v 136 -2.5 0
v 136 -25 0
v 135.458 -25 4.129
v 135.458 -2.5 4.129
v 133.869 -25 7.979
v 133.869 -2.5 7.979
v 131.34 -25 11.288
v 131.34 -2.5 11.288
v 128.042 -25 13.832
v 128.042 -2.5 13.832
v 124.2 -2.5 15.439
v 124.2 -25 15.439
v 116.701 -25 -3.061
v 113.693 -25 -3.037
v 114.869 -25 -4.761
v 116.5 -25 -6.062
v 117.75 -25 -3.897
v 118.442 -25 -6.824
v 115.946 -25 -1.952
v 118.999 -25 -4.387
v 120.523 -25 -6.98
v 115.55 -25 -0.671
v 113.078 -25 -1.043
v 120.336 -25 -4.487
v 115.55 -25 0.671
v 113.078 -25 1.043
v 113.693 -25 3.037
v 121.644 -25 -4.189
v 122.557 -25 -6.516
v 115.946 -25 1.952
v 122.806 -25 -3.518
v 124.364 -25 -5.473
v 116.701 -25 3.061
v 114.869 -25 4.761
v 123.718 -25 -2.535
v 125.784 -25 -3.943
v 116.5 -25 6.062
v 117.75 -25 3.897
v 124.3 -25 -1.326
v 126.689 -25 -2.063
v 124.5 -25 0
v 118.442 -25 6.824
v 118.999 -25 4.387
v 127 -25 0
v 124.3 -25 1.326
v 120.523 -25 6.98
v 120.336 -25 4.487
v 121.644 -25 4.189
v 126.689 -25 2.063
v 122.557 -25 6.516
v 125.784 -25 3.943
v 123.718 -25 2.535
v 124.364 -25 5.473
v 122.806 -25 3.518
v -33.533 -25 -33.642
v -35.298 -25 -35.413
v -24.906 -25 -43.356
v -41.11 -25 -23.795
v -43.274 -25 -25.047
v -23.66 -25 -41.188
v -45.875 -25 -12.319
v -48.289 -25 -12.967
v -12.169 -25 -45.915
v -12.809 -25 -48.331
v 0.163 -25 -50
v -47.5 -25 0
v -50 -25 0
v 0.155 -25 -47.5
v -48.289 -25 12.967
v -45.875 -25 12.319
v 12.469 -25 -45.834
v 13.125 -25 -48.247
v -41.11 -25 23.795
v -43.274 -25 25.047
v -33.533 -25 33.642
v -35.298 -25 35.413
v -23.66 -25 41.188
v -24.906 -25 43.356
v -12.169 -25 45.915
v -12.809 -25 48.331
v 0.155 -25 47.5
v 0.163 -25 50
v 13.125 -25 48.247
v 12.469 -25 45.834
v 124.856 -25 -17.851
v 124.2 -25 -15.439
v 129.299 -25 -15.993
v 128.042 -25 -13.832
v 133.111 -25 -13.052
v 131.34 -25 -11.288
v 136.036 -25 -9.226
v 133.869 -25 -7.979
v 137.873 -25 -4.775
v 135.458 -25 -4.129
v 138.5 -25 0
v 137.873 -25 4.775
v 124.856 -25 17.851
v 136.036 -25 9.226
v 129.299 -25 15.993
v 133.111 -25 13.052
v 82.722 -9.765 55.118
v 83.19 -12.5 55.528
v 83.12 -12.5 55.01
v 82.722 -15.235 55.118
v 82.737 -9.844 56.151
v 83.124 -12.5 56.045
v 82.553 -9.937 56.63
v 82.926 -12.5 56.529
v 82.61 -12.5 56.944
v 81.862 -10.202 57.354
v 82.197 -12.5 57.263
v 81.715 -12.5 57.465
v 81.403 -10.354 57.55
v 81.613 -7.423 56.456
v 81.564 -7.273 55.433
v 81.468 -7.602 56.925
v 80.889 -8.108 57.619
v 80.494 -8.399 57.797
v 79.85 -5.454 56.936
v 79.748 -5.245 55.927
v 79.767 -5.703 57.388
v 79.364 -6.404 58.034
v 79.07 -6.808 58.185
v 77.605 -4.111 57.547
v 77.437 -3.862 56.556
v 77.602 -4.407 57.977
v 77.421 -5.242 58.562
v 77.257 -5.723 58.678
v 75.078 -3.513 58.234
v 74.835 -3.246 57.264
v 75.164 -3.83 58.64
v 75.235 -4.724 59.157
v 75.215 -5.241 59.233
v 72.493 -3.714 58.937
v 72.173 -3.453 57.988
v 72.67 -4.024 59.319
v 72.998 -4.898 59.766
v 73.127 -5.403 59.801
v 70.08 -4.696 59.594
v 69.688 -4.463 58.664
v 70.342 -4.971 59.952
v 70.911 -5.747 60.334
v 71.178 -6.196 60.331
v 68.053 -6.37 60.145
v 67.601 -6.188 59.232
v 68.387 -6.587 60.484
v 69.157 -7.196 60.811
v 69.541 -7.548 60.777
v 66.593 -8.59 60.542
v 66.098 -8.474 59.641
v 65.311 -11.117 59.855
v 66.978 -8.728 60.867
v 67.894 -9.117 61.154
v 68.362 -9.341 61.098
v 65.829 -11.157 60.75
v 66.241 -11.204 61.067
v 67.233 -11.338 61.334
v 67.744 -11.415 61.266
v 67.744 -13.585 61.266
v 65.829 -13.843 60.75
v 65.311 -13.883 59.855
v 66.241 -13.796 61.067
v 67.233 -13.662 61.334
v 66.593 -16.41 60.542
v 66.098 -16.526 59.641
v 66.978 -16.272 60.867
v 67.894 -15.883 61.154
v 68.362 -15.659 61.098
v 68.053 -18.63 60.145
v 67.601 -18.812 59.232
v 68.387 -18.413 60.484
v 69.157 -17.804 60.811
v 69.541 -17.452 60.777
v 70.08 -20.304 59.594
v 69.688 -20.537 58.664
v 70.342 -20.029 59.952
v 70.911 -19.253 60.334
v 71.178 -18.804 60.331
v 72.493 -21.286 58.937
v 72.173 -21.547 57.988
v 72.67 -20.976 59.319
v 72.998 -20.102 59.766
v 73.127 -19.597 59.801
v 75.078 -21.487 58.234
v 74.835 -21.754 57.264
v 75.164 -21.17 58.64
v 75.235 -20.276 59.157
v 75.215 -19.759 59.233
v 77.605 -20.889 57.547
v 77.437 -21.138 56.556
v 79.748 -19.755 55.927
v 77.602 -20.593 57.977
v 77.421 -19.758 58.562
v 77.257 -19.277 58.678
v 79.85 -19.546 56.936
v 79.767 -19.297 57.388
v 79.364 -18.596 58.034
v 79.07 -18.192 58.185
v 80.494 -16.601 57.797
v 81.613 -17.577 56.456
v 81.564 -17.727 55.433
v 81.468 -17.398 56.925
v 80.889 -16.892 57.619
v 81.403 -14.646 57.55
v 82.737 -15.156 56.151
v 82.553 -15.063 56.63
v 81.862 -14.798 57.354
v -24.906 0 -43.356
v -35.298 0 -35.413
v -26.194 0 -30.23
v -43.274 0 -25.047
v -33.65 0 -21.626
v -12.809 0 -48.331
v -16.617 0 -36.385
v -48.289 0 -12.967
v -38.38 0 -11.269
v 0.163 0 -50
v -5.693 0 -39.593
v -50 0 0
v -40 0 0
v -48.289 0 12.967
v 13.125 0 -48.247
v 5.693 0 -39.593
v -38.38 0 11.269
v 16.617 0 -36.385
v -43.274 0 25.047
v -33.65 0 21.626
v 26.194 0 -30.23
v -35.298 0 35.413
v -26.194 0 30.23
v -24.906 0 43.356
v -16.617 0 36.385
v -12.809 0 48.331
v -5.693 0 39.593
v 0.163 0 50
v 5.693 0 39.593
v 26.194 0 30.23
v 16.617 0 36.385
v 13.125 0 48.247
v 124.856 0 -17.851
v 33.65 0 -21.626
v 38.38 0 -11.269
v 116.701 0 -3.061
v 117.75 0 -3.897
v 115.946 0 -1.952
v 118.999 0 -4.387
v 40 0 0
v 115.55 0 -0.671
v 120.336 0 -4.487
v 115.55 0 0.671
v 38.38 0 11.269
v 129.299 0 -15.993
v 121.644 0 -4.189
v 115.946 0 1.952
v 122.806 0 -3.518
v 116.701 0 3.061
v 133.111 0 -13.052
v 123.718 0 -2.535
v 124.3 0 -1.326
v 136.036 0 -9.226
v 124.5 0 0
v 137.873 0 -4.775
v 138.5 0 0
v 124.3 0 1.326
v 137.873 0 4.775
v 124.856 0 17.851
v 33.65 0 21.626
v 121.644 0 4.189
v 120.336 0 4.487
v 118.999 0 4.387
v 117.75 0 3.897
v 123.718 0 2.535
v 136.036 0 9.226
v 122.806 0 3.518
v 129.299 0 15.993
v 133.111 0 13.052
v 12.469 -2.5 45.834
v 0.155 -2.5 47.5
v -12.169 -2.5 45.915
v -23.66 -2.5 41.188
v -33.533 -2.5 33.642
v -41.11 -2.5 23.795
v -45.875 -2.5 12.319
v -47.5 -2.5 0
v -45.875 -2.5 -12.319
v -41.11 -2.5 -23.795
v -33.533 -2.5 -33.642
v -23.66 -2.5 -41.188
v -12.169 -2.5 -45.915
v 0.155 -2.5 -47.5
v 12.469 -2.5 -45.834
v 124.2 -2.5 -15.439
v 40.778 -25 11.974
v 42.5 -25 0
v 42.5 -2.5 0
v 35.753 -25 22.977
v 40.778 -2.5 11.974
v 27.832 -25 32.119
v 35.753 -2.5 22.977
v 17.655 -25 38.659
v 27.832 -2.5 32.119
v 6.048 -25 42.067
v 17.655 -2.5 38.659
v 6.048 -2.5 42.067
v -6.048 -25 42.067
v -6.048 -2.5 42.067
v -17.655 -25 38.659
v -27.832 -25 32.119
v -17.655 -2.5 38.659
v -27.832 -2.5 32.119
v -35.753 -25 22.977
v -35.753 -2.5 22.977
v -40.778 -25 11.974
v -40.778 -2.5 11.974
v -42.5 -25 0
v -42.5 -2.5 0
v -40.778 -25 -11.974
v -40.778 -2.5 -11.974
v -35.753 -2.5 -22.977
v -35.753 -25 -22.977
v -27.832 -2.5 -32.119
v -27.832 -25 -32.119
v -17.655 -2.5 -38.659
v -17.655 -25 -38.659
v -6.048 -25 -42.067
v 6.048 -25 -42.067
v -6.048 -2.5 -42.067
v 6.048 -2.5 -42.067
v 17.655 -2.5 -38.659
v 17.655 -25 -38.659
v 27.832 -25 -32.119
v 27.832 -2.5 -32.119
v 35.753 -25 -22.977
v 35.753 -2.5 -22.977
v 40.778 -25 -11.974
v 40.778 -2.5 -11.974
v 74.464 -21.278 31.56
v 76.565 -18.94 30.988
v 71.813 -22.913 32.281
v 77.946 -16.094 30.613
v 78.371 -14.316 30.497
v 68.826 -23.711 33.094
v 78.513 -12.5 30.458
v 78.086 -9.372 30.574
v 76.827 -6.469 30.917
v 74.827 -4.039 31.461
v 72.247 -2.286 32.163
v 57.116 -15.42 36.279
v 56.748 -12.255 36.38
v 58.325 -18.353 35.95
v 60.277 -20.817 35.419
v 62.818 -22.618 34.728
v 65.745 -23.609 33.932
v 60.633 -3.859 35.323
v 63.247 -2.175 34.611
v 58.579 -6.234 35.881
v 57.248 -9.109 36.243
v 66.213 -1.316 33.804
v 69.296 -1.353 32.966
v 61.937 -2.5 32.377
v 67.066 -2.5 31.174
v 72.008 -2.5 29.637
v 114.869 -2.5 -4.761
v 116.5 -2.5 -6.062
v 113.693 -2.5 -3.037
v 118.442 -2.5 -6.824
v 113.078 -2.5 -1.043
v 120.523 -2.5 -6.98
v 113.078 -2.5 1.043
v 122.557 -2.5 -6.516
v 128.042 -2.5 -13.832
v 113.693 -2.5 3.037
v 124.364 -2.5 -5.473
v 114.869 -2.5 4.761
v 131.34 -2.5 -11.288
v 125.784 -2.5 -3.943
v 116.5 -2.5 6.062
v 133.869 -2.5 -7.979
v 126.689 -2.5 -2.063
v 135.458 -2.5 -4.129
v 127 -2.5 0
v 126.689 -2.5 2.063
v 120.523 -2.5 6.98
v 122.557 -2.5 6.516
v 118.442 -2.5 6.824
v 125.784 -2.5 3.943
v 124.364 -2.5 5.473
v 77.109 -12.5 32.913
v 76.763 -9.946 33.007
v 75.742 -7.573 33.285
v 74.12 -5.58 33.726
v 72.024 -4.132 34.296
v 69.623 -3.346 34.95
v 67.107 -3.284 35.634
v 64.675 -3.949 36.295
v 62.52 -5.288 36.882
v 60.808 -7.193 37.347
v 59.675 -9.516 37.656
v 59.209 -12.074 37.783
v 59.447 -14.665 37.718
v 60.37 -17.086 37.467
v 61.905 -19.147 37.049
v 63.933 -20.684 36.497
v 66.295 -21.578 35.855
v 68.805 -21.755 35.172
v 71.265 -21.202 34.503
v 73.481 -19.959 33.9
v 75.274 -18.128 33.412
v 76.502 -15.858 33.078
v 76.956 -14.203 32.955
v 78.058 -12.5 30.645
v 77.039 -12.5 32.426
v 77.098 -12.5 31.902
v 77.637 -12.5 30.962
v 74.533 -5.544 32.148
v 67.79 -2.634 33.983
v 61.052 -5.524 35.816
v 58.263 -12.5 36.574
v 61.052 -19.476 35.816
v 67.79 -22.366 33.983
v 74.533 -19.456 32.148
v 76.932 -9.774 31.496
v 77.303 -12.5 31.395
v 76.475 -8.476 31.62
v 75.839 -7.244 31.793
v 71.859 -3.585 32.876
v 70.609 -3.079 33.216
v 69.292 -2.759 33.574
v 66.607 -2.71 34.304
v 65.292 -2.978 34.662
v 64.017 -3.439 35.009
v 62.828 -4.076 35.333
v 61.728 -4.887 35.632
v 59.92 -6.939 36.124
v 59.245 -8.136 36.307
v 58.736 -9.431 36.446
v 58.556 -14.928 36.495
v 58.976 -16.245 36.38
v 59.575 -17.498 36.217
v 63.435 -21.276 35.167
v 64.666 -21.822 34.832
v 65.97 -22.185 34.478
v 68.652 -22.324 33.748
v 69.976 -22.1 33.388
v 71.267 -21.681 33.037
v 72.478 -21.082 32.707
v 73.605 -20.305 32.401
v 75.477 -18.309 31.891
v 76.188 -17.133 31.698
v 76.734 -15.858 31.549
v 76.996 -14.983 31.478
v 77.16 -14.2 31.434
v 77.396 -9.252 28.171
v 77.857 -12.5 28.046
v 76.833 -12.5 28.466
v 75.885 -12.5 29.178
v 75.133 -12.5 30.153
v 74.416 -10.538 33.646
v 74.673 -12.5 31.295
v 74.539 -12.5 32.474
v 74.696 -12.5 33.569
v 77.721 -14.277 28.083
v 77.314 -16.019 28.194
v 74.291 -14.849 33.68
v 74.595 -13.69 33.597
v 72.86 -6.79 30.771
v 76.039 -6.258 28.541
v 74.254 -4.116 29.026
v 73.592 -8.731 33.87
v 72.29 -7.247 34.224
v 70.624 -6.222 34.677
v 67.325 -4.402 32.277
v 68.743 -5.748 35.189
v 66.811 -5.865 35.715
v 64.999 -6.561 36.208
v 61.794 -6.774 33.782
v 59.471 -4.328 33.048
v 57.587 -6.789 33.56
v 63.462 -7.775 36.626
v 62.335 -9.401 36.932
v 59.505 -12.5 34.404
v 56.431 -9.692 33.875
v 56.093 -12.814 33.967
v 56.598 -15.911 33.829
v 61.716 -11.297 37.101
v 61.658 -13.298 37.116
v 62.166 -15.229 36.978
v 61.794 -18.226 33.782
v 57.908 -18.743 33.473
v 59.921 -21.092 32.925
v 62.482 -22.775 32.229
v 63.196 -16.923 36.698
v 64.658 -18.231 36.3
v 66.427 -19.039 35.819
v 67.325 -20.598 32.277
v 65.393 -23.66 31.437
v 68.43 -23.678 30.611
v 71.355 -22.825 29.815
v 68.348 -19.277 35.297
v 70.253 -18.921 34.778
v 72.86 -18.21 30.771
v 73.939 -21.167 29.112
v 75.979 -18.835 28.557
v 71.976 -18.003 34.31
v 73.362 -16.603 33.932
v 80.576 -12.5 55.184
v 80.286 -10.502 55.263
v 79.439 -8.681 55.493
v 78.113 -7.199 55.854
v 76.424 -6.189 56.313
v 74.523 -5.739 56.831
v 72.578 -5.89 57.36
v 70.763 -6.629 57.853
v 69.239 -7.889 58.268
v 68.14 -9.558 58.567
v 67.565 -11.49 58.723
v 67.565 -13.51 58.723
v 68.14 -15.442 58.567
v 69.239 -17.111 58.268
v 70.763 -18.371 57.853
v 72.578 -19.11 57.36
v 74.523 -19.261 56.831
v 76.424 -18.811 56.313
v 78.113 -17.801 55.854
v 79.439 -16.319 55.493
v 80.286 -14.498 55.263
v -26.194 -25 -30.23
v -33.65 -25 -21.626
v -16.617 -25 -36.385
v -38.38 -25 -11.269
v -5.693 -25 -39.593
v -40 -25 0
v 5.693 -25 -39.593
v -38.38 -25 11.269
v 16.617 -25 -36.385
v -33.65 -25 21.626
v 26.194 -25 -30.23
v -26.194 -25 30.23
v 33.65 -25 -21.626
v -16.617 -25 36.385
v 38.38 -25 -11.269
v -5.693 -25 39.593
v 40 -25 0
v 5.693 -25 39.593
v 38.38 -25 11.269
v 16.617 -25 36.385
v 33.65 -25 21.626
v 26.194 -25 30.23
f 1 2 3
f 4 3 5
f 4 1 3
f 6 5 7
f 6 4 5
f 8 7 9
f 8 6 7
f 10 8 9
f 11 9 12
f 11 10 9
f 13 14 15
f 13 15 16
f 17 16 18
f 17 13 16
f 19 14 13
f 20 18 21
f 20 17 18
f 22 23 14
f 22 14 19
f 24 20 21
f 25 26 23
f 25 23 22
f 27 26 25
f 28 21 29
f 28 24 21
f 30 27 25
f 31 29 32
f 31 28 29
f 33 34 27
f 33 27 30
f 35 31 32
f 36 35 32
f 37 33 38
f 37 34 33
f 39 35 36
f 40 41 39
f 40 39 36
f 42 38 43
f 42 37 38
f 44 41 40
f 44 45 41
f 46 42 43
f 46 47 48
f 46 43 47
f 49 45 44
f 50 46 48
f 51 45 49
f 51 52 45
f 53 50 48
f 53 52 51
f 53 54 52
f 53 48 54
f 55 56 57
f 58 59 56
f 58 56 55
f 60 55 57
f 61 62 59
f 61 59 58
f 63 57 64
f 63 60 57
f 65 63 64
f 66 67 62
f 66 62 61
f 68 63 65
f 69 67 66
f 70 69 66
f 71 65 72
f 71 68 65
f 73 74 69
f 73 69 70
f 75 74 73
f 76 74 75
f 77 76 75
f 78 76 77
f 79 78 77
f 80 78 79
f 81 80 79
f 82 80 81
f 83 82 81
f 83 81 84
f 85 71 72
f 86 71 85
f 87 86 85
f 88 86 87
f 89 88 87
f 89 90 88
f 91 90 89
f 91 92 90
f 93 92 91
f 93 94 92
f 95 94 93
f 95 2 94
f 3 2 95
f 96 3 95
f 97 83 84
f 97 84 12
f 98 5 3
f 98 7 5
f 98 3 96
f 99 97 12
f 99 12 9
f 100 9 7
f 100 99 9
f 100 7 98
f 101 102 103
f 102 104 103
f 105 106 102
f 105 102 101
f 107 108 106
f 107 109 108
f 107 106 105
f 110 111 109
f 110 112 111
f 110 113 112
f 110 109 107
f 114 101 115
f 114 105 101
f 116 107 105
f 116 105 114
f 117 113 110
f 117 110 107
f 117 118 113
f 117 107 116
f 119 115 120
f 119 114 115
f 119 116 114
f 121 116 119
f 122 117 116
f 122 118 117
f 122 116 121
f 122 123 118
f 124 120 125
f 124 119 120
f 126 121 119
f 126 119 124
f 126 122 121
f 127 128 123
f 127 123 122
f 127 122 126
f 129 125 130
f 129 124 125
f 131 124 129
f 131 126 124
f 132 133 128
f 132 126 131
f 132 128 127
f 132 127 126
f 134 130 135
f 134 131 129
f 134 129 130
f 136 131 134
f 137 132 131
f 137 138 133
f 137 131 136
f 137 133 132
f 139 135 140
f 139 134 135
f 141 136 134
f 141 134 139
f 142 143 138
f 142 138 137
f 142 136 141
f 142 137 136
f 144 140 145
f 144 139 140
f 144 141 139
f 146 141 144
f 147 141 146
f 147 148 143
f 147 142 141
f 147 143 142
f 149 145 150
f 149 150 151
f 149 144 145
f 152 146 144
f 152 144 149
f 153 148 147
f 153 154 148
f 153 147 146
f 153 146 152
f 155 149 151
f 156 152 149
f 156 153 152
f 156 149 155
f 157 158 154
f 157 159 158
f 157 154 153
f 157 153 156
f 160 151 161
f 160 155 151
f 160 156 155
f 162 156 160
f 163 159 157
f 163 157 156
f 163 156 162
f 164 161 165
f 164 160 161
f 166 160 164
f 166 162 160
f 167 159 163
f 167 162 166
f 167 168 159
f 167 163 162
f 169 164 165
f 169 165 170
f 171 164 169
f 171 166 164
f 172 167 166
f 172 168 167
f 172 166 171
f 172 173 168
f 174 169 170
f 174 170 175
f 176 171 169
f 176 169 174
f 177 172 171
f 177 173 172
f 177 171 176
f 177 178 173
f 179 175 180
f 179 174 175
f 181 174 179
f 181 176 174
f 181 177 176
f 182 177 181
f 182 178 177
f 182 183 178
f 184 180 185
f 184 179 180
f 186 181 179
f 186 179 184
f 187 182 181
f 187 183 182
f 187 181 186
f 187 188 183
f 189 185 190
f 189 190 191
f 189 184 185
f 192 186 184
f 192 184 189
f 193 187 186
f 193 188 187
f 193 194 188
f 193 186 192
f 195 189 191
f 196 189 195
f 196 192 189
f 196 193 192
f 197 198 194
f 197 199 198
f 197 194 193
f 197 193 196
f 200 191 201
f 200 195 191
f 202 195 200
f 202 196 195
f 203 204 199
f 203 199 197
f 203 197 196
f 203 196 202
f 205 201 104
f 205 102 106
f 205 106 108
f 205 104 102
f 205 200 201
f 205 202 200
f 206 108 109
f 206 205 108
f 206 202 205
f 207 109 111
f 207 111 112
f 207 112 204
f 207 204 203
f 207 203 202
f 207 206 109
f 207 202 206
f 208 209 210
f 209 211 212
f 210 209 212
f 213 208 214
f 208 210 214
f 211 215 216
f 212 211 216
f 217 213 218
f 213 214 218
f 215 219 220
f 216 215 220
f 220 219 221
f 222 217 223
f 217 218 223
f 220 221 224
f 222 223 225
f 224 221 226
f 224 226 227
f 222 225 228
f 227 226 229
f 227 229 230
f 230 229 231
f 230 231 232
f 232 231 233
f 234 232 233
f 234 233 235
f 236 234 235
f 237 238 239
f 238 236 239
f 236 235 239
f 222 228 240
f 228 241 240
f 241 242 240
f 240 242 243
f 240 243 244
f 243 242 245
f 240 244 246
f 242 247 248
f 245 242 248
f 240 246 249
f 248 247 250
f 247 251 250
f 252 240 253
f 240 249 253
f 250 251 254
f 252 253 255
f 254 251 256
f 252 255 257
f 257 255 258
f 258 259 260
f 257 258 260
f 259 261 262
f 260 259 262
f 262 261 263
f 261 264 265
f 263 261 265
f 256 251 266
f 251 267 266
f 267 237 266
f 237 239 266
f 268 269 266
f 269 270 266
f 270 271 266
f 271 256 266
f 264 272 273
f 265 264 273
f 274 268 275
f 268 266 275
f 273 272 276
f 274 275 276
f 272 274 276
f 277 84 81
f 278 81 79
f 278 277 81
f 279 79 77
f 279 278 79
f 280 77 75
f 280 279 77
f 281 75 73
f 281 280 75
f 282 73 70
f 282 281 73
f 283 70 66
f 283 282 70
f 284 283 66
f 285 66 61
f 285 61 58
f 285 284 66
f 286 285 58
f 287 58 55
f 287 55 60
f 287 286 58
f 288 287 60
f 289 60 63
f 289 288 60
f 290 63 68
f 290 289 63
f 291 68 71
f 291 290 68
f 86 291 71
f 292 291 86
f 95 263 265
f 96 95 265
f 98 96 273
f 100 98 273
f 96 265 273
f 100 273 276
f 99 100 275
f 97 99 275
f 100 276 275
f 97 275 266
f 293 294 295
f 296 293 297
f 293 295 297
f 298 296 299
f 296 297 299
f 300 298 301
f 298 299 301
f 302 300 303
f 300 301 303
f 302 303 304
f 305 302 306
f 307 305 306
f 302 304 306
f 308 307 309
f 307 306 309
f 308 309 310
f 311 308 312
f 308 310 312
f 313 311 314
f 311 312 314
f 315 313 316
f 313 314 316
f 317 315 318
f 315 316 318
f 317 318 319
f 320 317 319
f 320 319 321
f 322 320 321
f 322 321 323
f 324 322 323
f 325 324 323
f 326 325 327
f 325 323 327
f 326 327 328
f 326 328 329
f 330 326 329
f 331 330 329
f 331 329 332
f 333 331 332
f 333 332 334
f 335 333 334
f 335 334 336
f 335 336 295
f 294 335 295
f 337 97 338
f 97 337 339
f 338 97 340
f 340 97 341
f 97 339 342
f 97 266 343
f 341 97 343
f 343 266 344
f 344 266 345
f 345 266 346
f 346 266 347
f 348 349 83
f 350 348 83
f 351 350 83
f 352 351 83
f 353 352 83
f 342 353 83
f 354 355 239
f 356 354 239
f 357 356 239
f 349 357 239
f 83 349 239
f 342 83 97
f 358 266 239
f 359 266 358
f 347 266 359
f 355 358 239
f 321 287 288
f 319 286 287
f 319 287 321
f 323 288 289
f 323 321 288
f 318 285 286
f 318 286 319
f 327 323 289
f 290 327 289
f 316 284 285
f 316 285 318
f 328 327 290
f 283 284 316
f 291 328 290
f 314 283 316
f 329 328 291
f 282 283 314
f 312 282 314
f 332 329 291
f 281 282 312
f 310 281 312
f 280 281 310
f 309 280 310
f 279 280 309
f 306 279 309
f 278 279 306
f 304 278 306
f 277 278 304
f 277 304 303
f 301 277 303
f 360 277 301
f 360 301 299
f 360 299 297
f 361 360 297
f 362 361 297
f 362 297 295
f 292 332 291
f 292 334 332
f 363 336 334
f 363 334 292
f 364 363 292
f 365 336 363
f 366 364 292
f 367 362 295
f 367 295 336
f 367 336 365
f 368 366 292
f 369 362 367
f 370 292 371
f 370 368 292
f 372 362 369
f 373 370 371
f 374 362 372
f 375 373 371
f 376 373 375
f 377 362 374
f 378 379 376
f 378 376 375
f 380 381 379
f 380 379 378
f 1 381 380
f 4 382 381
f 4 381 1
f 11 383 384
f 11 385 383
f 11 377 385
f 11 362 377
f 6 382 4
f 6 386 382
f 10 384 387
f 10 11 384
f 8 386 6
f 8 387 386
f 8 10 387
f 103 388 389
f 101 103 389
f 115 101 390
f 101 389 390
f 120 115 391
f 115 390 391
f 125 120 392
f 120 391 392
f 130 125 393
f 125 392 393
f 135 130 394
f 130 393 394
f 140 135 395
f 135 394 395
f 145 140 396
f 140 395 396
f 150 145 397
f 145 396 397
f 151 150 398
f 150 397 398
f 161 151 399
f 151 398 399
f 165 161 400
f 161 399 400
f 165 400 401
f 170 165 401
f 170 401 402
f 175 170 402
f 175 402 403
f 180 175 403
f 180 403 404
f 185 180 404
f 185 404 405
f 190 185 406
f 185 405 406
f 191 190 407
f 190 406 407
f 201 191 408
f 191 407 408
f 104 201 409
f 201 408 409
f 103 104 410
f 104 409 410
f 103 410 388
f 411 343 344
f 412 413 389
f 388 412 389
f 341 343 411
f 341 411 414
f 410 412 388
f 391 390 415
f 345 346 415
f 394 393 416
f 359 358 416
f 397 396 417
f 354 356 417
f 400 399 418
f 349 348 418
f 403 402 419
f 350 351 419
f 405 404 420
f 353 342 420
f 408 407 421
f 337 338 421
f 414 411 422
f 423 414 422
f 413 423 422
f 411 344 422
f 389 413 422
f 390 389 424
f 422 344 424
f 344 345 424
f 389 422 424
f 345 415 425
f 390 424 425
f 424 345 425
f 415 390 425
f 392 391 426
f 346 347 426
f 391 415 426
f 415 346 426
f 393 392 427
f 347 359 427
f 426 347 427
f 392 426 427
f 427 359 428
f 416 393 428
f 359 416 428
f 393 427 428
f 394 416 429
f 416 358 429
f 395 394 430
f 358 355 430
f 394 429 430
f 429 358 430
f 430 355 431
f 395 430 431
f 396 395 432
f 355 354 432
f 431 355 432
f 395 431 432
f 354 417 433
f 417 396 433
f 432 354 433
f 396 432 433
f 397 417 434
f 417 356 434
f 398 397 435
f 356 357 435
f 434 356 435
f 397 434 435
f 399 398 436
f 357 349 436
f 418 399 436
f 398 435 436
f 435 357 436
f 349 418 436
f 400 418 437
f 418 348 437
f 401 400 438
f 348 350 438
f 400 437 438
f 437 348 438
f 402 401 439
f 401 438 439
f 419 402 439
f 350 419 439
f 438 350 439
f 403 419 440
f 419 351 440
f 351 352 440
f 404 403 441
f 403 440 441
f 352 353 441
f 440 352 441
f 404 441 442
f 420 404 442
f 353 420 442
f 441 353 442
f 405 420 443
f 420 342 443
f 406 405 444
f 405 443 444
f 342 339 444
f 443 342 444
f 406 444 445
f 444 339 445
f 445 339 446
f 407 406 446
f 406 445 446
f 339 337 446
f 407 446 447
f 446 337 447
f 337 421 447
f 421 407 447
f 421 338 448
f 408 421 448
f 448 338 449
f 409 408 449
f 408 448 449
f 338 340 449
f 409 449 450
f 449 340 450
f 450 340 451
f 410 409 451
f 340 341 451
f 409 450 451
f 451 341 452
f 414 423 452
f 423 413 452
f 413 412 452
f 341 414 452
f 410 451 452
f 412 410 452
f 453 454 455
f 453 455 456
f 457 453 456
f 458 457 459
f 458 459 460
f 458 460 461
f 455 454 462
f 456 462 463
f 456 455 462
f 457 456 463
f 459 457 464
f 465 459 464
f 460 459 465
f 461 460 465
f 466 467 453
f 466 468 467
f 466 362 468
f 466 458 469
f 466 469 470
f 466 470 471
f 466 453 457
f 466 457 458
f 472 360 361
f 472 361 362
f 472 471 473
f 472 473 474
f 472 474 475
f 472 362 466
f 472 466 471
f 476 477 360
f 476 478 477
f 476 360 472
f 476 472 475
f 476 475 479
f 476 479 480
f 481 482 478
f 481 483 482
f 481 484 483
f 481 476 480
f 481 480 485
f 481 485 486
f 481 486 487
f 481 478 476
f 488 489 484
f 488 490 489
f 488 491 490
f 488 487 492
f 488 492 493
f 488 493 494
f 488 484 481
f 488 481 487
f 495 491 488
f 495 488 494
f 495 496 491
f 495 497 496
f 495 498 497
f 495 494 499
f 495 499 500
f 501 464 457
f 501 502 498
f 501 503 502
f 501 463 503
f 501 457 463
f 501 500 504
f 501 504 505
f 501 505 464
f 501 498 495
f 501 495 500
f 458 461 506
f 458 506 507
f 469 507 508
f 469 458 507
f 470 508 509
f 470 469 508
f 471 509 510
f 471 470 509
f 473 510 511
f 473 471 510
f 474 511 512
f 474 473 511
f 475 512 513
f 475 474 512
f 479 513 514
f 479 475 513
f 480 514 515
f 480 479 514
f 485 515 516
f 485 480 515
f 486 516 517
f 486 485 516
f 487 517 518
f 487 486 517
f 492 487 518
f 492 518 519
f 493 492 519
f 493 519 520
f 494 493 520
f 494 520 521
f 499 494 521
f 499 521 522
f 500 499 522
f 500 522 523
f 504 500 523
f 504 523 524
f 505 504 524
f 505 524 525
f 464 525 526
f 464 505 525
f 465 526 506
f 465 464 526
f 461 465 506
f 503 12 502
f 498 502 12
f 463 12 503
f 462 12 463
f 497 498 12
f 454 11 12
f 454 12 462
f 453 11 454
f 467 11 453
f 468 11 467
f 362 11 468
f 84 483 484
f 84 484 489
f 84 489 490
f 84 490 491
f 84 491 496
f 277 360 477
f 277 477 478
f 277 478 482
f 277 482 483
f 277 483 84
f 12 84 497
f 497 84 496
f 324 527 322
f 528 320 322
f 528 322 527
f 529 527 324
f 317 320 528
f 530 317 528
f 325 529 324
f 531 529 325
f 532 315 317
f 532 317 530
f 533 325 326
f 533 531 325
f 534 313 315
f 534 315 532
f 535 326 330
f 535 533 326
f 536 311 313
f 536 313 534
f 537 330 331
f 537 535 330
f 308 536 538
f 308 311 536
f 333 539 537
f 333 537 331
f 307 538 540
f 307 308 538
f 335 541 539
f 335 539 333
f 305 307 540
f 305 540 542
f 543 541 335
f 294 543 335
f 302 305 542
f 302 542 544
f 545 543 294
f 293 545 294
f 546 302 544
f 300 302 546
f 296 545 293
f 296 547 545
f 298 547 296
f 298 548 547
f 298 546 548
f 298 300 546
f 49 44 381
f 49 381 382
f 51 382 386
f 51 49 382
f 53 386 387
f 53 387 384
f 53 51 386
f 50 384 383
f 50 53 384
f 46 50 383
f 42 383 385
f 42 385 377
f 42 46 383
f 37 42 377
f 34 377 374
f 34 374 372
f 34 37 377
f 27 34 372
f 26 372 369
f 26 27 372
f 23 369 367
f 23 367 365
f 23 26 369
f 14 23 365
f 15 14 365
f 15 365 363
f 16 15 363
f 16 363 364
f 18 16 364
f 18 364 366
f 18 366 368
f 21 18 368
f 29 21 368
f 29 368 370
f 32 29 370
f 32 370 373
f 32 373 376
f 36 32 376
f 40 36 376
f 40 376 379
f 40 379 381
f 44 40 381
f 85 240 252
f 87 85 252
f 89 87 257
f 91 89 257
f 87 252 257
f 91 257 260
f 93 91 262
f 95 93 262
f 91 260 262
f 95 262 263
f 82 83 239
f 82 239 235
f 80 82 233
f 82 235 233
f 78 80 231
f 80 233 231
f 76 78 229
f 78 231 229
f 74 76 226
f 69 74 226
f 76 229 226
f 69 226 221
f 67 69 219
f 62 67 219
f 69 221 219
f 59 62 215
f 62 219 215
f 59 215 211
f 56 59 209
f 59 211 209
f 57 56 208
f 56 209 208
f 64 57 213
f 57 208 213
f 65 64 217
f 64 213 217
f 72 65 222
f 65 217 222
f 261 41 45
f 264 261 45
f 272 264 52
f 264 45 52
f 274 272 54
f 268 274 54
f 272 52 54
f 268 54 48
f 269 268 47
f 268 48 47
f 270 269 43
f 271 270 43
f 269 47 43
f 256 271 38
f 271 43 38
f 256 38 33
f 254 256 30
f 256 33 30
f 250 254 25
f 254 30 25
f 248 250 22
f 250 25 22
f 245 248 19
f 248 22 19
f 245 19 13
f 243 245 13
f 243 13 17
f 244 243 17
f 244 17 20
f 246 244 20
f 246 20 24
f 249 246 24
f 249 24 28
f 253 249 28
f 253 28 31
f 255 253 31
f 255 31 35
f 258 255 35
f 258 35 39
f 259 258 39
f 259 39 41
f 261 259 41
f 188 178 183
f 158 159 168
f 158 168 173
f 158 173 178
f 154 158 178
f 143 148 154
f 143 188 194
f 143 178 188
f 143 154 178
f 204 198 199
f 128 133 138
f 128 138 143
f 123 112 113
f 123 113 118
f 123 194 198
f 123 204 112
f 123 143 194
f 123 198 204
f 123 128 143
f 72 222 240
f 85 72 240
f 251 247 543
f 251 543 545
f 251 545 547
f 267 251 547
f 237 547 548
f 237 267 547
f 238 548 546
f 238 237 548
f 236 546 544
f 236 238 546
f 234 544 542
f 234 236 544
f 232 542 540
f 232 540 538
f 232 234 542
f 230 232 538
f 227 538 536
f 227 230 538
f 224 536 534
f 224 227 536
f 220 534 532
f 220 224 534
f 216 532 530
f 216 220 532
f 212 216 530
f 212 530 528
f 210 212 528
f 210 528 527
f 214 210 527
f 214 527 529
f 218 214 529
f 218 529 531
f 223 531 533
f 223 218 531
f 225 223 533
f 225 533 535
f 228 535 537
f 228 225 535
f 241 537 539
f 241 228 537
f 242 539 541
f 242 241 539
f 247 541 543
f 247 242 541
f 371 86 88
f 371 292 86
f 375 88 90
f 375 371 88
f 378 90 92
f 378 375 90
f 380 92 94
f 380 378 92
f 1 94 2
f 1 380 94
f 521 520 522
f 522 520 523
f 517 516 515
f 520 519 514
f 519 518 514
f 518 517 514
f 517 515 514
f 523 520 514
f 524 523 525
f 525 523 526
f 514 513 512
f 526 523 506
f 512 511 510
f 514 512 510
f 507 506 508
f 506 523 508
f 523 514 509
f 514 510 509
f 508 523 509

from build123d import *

# Parameters (mm, degrees)
F0_R     = 40
F1_DEPTH = 25
F2_R     = 9.27978
F3_DEPTH = 26.9
F4_R     = 2
F5_R     = 4.5
F6_DEPTH = 25.001
F7_T     = -2.5


with BuildPart() as f1:
    # F0 (on Front) → F1 (new body)
    with BuildSketch(Plane.XZ):
        with BuildLine():
            ThreePointArc((13.125, -48.2466), (39.725621, -30.362395), (50, 0))
            ThreePointArc((50, 0), (39.725621, 30.362395), (13.125, 48.2466))
            ThreePointArc((13.125, 48.2466), (-50, 0), (13.125, -48.2466))
        make_face()
        Circle(F0_R, mode=Mode.SUBTRACT)
        with BuildLine():
            ThreePointArc((13.125, 48.2466), (39.725621, 30.362395), (50, 0))
            ThreePointArc((50, 0), (39.725621, -30.362395), (13.125, -48.2466))
            Line((13.125, -48.2466), (124.85625, -17.851242))
            ThreePointArc((124.85625, -17.851242), (101.5, 0), (124.85625, 17.851242))
            Line((124.85625, 17.851242), (13.125, 48.2466))
        make_face()
        with BuildLine():
            ThreePointArc((138.5, 0), (134.69848, 11.234086), (124.85625, 17.851242))
            ThreePointArc((124.85625, 17.851242), (101.5, 0), (124.85625, -17.851242))
            ThreePointArc((124.85625, -17.851242), (134.69848, -11.234086), (138.5, 0))
        make_face()
    extrude(amount=F1_DEPTH)

    # F2 (on face) → F3 (join)
    with BuildSketch(Plane(origin=(13.125, 0, 48.2466), x_dir=(0.964932, 0, -0.2625), z_dir=(0.2625, 0, 0.964932))):
        with Locations((56.484982, -12.5)):
            Circle(F2_R)
    extrude(amount=F3_DEPTH)

    # F4
    f4_edges = [f1.edges().sort_by_distance(p)[0] for p in [
        (65.73606, -12.5, 61.811904),
        (58.67481, -12.5, 35.855234),
    ]]
    fillet(f4_edges, radius=F4_R)

    # F5 (on face) → F6 (cut, through all)
    with BuildSketch(Plane.XZ.offset(25)):
        with Locations((120, 0)):
            Circle(F5_R)
    extrude(amount=-F6_DEPTH, mode=Mode.SUBTRACT)

    # F7
    f7_openings = [f1.faces().sort_by_distance(p)[0] for p in [
        (52.131114, -25, 0),
    ]]
    offset(amount=F7_T, openings=f7_openings)


solid = f1.part
